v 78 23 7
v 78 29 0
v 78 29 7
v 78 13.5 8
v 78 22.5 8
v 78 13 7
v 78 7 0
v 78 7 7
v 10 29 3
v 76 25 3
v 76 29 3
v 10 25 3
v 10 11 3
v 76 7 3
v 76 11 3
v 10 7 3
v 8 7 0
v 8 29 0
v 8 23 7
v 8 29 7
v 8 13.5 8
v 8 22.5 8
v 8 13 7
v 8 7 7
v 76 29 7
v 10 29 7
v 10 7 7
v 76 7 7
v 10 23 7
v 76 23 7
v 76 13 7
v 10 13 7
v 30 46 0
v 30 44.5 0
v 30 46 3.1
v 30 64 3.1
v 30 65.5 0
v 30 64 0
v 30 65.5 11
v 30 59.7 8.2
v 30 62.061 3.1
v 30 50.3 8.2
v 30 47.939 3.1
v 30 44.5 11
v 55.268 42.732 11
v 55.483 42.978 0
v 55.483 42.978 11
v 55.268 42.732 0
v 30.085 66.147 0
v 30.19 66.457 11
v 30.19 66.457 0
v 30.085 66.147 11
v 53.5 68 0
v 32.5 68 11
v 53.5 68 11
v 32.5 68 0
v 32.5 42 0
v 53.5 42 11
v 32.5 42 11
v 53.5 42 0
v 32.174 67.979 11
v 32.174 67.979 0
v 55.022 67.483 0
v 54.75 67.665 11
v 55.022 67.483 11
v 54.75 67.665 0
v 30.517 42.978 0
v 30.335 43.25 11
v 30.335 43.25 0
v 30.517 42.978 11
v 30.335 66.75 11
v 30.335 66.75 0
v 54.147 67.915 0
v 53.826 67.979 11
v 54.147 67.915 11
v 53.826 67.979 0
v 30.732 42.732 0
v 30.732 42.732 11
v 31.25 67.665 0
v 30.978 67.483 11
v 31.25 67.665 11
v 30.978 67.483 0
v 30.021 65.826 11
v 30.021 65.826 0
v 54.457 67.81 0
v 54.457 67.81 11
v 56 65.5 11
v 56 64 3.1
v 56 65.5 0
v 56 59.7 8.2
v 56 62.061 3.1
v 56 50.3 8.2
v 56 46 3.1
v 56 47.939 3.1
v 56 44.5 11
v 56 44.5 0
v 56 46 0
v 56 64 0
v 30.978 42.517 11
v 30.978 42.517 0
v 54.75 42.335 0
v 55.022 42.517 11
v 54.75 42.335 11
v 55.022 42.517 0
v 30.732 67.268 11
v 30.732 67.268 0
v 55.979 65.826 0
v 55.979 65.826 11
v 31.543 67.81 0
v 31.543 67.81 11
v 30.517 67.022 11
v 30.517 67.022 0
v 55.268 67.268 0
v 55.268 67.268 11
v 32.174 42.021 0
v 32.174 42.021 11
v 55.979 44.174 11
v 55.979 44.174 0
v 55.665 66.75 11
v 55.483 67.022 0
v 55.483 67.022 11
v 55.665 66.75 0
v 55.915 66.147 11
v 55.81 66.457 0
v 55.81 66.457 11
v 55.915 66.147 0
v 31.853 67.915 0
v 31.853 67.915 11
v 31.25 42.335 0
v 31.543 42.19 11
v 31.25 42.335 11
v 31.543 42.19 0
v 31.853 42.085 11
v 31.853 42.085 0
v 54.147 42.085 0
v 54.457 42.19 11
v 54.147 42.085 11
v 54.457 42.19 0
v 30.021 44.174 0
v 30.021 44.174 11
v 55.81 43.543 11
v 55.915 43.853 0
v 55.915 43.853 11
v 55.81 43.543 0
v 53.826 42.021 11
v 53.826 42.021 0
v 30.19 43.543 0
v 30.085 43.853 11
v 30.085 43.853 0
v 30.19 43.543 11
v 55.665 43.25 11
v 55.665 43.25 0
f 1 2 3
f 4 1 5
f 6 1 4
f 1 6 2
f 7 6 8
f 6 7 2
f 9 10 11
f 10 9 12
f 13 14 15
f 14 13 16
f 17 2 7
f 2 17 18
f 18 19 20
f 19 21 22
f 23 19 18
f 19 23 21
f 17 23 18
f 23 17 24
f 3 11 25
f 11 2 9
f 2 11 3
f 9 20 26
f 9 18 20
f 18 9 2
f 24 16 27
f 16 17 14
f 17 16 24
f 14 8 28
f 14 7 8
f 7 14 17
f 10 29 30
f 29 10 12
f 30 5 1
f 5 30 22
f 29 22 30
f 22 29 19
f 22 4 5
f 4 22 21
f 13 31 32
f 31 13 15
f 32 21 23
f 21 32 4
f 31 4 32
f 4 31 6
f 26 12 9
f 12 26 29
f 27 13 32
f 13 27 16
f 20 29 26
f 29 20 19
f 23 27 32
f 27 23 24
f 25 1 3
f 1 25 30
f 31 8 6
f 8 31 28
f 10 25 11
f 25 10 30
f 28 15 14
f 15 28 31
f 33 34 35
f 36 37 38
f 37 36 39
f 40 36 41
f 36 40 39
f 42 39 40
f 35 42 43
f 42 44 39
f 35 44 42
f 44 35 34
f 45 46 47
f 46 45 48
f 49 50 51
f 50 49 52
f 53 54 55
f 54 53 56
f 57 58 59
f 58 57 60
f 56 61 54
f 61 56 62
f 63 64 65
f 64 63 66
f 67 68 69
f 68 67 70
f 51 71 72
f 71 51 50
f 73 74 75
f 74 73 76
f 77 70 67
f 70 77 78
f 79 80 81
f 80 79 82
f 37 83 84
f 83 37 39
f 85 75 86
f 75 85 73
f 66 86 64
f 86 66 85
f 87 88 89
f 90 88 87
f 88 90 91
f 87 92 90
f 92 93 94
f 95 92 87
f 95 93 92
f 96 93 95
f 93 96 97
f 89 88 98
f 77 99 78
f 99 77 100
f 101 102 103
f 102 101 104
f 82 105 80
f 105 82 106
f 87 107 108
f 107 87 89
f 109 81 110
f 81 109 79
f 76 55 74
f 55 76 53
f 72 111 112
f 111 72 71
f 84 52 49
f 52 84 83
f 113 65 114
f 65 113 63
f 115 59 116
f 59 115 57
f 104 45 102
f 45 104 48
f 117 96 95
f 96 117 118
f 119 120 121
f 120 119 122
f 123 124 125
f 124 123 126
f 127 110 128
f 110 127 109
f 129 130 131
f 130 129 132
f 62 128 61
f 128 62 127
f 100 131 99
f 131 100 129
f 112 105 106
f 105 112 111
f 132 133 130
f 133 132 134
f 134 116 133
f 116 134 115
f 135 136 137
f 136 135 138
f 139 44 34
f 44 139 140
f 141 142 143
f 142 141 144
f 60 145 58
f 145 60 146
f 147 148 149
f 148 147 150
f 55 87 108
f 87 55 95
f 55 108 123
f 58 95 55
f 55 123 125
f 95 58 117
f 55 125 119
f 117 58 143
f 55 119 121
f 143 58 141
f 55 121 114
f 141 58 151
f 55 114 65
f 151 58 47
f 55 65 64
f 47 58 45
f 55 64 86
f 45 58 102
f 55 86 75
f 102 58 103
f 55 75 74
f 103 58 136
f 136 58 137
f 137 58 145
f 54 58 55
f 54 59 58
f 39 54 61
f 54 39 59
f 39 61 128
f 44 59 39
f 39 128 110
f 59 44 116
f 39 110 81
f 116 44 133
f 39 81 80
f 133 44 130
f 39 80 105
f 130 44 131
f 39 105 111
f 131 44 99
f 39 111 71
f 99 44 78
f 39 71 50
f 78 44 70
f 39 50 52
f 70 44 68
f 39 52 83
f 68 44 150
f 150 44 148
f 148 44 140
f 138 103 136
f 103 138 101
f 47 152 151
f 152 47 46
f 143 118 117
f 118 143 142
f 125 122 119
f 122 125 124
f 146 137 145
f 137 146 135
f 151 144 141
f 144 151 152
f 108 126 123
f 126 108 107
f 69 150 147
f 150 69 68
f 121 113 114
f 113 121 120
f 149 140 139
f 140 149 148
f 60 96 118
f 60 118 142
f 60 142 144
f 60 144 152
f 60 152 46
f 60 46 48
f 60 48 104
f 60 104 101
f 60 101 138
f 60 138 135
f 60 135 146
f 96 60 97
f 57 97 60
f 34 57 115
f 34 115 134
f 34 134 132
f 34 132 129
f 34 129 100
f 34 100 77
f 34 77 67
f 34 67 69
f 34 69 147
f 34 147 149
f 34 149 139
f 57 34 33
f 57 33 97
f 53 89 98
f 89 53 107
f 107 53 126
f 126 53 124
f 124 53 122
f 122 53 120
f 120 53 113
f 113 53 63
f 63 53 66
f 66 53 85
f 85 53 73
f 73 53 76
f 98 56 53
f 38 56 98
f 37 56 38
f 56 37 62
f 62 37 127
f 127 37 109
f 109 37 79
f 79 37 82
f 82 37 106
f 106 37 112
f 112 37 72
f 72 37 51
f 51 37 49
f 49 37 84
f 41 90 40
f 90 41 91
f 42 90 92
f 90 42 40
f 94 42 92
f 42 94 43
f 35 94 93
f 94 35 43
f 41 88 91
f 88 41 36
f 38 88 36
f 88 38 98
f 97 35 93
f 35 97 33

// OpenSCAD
/*
Sample 085: Schwalbenschwanz-Linearführung — 0,20 mm
Generated from the FDM Mechanical Sample Library.
Units: millimetres.

Override examples:
  openscad -o custom.stl -D 'view="plate"' -D 'render_fn=64' model.scad
  openscad -o preview.png -D 'view="assembly"' model.scad
*/
use <../../../library/fdm_mechanisms.scad>

render_fn = is_undef(render_fn) ? 48 : render_fn;
view = is_undef(view) ? "plate" : view;
$fn = render_fn;

sample_dovetail_rail(
    view=view,
    clearance=0.2,
    length=70,
    carriage_l=26
);
